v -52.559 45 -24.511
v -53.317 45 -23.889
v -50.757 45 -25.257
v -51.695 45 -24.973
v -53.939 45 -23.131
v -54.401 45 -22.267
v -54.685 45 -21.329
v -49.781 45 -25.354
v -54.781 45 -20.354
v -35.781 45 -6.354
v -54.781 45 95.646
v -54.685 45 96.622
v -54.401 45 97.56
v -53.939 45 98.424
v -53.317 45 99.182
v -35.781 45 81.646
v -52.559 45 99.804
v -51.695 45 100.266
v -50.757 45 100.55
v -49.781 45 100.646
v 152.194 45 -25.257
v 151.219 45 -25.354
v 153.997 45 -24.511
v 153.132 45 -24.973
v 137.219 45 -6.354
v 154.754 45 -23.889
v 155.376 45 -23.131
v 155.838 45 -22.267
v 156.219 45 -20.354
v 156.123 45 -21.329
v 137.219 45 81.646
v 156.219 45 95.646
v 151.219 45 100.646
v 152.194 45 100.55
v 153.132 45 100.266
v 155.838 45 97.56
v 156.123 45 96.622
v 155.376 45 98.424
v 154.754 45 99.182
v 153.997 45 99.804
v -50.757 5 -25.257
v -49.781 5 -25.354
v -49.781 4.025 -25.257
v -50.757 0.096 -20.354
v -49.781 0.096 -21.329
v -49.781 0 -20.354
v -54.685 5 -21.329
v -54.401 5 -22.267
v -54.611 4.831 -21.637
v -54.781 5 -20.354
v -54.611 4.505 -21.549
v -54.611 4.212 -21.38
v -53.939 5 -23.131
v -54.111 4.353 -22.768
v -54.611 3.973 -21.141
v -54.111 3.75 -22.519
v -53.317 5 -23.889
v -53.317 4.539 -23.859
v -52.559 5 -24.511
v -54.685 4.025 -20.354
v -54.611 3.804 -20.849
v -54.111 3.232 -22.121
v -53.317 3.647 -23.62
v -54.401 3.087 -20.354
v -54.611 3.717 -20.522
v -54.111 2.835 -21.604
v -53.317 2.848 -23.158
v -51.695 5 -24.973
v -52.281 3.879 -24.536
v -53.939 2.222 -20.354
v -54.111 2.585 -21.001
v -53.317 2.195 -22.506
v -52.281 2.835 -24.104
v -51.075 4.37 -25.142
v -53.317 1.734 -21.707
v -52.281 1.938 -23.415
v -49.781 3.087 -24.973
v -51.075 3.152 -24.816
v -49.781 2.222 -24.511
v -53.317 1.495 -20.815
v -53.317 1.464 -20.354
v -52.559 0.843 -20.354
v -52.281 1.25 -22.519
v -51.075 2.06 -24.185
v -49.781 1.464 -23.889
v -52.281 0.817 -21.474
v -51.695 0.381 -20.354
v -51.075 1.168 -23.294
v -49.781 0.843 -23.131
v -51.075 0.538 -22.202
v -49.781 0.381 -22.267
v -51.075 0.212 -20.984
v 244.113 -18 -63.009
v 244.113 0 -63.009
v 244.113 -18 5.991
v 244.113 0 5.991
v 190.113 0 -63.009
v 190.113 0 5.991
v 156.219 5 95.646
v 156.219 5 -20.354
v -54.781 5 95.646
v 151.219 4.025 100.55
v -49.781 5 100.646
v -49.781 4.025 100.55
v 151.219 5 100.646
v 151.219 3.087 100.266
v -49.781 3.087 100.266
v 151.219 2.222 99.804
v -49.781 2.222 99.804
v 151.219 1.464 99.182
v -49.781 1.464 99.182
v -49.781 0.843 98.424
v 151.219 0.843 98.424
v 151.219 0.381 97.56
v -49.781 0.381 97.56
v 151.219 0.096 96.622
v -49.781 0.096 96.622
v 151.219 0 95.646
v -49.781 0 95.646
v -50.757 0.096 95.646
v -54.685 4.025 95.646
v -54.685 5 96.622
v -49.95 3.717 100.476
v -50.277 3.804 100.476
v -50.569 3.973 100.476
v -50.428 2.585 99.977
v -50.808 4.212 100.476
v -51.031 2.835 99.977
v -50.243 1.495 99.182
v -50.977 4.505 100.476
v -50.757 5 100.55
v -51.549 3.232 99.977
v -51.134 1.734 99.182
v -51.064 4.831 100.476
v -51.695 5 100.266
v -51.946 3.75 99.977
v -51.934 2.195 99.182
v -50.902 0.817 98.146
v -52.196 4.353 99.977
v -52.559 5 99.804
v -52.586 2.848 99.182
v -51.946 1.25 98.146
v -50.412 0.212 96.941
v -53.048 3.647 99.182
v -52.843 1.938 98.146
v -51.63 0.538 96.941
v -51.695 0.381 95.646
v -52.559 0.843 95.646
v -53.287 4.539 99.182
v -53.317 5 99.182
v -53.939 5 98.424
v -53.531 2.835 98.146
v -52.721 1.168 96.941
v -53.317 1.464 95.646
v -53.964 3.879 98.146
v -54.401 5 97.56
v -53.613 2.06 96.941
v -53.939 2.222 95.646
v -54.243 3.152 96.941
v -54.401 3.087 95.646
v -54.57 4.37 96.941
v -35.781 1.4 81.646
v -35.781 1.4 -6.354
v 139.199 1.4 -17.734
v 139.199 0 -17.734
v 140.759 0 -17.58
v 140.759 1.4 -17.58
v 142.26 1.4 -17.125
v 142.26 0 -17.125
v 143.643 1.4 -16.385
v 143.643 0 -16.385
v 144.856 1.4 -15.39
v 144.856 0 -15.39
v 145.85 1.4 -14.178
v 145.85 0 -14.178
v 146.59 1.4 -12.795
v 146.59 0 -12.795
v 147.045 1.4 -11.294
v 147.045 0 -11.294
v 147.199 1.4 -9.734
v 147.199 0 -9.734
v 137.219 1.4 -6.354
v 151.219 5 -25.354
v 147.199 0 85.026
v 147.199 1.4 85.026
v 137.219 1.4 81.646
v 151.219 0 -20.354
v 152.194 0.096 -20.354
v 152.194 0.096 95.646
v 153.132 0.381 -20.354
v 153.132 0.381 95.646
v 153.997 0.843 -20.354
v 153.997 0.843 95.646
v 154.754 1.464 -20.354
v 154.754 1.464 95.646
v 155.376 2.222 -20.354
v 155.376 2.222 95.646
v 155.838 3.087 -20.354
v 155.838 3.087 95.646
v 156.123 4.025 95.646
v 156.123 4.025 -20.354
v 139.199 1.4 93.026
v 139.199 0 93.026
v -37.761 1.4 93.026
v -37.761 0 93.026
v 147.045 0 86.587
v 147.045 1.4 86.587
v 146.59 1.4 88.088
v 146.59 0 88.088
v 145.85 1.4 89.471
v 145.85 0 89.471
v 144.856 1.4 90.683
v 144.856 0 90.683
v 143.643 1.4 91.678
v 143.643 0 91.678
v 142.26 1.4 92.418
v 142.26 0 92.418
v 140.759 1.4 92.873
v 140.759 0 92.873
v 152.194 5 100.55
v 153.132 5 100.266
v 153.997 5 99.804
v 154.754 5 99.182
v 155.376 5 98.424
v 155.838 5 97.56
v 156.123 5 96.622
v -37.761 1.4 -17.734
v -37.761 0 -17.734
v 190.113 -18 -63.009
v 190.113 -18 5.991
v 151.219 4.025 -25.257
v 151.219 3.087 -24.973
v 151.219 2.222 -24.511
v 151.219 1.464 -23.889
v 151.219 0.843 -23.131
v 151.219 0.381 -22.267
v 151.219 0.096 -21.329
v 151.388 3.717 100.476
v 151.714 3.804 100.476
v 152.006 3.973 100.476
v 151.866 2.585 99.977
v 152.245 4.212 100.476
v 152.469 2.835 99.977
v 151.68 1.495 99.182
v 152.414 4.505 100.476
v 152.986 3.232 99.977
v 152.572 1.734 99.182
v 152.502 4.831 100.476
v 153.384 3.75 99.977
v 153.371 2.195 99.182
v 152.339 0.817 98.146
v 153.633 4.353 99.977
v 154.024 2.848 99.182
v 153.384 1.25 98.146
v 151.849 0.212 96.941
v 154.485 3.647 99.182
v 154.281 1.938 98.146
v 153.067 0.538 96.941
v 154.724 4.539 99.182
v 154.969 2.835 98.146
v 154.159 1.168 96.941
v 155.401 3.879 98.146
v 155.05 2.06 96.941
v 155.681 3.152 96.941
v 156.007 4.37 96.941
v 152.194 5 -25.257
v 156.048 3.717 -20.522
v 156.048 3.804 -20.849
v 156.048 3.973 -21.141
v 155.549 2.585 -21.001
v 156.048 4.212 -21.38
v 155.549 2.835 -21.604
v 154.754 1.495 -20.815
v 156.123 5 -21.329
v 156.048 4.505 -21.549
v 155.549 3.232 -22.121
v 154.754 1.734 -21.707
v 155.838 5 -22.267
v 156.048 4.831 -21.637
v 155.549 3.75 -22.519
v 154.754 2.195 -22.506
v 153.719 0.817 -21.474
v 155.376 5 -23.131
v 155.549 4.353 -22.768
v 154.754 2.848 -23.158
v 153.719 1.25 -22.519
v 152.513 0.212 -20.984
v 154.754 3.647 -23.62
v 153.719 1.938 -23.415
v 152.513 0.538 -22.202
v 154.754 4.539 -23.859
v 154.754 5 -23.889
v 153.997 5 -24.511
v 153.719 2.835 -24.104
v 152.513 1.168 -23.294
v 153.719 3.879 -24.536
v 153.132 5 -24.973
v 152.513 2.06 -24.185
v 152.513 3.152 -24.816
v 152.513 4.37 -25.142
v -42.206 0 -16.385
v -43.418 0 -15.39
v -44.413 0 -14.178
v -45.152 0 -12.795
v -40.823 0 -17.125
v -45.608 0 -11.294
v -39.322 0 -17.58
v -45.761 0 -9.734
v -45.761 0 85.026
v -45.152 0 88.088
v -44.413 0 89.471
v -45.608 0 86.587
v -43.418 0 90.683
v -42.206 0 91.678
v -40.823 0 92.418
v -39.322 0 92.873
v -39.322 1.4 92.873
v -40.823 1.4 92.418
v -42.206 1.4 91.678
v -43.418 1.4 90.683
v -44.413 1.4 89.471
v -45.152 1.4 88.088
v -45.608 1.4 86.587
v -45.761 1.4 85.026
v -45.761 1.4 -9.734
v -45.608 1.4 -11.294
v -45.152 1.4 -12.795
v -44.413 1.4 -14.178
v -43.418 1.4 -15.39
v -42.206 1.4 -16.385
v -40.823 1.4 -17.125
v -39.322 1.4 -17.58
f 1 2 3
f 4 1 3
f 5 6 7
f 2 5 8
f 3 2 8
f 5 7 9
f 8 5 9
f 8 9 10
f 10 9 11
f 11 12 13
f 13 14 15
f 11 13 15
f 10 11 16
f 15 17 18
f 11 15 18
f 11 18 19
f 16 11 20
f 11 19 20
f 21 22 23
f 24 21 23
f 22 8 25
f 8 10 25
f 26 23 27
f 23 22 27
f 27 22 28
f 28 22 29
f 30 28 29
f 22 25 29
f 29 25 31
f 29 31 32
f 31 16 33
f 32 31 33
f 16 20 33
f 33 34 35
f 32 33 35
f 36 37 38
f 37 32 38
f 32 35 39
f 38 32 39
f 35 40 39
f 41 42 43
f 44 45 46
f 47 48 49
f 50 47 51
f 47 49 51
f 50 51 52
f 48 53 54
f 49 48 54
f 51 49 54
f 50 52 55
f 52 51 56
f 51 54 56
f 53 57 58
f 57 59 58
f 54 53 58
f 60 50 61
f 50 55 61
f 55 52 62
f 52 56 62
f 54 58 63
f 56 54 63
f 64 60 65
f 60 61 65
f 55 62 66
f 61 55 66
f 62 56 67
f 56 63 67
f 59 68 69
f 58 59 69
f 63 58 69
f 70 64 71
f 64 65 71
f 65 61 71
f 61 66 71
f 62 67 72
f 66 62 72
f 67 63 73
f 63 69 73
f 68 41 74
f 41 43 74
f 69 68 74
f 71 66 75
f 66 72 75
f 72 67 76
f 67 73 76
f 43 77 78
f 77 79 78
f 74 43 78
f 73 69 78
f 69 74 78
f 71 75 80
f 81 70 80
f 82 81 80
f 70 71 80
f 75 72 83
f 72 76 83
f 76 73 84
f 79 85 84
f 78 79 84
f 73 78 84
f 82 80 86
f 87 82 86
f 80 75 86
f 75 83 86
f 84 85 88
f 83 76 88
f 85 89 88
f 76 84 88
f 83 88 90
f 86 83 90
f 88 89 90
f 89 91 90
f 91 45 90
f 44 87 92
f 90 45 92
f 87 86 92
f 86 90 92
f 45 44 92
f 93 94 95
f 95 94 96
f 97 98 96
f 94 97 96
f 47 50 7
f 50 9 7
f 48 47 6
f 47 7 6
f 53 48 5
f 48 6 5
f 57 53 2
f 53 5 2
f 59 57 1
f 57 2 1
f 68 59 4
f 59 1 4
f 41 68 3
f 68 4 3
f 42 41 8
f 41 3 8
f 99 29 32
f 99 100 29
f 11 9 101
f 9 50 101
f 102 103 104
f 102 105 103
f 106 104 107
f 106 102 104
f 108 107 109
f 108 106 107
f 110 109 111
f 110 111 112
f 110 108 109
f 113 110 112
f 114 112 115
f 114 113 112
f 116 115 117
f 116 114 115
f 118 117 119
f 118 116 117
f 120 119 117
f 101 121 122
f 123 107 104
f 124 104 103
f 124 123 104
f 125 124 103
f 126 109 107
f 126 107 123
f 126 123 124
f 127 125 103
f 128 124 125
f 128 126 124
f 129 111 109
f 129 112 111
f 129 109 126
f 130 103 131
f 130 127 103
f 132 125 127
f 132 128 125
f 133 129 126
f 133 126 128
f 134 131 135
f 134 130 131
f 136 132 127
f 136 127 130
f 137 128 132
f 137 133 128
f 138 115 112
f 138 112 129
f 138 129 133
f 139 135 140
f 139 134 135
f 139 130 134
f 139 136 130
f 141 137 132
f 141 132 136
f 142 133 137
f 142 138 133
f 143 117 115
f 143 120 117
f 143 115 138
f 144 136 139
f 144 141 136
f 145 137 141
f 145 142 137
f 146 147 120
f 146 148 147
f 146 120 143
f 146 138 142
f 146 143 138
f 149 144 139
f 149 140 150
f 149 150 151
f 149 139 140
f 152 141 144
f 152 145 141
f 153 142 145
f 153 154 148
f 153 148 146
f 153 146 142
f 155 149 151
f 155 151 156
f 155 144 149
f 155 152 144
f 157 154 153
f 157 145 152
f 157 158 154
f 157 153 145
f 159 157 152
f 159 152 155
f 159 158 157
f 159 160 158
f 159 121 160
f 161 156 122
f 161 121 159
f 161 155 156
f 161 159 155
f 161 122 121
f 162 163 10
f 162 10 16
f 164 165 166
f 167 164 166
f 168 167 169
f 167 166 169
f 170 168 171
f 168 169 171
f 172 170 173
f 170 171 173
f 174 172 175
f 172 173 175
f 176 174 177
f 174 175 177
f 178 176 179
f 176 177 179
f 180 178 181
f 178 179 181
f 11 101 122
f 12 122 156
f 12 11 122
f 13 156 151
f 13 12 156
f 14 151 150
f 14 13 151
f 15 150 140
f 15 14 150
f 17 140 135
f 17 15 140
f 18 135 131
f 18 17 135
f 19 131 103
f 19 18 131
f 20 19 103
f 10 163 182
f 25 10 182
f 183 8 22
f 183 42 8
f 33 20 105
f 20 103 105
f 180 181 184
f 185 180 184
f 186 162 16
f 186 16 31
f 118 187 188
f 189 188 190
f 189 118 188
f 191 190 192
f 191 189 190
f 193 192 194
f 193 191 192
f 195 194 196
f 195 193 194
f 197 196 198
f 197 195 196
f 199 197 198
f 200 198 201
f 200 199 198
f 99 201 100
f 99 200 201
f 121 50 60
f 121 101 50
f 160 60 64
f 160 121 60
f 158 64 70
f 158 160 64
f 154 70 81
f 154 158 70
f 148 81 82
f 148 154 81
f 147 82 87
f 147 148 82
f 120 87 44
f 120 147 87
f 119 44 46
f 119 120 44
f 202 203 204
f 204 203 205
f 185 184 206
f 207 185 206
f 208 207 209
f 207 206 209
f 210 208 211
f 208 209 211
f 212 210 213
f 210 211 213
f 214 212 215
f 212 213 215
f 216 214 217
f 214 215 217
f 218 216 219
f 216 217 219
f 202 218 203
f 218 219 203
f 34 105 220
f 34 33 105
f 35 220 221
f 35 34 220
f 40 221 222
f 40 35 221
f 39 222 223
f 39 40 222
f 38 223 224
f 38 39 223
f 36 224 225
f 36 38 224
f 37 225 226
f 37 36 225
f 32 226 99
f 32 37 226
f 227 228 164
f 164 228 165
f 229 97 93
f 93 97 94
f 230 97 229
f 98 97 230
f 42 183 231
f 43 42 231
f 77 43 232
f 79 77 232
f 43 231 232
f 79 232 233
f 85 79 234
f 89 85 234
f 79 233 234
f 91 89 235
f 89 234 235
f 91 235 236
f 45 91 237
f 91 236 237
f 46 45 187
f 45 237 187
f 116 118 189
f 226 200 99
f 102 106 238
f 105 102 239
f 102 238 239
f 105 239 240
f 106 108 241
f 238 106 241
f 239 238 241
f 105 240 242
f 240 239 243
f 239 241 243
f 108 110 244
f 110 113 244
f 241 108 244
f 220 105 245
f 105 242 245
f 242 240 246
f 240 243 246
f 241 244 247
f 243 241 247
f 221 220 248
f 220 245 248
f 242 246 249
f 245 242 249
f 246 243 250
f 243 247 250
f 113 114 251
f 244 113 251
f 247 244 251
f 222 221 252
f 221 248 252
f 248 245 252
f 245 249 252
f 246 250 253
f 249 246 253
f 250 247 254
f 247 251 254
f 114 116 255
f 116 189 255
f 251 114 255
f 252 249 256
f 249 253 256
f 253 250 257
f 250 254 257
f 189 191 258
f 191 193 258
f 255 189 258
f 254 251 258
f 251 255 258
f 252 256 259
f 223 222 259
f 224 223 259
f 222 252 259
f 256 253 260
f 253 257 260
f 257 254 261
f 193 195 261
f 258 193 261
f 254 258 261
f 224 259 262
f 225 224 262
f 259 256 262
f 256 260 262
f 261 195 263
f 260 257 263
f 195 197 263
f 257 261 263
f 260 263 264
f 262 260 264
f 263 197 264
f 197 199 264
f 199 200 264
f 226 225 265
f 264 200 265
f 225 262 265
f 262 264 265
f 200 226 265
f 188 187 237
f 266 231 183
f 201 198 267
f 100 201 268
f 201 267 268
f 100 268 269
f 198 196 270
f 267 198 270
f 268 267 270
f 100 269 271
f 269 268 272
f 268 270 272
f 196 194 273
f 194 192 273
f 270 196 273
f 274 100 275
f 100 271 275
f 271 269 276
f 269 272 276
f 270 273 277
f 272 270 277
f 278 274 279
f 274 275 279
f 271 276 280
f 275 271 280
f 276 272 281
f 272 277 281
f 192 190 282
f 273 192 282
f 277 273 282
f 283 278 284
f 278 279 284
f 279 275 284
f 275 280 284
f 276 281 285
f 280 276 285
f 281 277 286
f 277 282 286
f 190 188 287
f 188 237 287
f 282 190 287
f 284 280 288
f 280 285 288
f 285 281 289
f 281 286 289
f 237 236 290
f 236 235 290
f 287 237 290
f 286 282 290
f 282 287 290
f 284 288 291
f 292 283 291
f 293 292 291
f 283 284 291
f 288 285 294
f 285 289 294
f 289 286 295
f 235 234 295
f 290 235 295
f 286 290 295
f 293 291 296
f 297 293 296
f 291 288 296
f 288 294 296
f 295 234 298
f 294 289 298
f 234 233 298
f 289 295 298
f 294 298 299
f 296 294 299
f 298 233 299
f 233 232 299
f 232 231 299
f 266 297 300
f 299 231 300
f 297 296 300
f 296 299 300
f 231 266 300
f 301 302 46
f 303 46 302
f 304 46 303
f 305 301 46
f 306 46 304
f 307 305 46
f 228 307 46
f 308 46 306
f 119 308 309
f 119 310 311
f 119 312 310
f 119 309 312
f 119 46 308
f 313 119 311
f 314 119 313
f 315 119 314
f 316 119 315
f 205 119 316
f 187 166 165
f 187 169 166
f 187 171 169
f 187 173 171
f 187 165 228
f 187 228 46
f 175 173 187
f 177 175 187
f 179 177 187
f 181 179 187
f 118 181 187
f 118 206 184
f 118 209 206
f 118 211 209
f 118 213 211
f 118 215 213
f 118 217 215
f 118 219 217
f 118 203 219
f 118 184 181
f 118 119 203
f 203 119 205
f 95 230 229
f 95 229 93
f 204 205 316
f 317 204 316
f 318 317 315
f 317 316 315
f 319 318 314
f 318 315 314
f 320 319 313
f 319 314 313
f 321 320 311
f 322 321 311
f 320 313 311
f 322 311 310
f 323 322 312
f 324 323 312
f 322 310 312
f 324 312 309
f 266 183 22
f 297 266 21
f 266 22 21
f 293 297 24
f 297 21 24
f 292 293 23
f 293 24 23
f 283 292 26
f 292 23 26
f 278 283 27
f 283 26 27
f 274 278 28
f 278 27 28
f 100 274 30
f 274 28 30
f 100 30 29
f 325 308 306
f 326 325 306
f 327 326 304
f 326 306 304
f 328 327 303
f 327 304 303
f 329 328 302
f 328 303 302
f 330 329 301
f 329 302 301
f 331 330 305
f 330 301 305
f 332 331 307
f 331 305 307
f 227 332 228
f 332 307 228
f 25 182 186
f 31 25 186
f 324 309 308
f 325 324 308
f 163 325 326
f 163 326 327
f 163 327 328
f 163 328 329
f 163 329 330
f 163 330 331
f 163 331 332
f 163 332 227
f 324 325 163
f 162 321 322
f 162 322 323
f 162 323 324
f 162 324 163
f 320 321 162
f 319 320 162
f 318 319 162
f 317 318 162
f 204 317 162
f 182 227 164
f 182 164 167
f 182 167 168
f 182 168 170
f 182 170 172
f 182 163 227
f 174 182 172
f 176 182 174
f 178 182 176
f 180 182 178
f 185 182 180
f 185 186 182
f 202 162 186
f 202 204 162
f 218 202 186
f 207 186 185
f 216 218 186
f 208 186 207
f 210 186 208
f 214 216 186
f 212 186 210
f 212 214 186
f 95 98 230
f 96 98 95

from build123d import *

# Parameters (mm, degrees)
F0_W     = 211
F0_H     = 126
F0_W_2   = 173
F0_H_2   = 88
F1_DEPTH = 45
F2_DEPTH = 1.4
F3_R     = 5
F4_W     = 54
F4_H     = 69
F5_DEPTH = 18


with BuildPart() as f1:
    # F0 (on Front) → F1 (new body)
    with BuildSketch(Plane.XZ):
        with Locations((50.718681, 37.646487)):
            Rectangle(F0_W, F0_H)
        with BuildLine():
            ThreePointArc((-45.761319, 85.026487), (-43.418173, 90.683341), (-37.761319, 93.026487))
            Line((-37.761319, 93.026487), (139.198681, 93.026487))
            ThreePointArc((139.198681, 93.026487), (144.855535, 90.683341), (147.198681, 85.026487))
            Line((147.198681, 85.026487), (147.198681, -9.733513))
            ThreePointArc((147.198681, -9.733513), (144.855535, -15.390367), (139.198681, -17.733513))
            Line((139.198681, -17.733513), (-37.761319, -17.733513))
            ThreePointArc((-37.761319, -17.733513), (-43.418173, -15.390367), (-45.761319, -9.733513))
            Line((-45.761319, -9.733513), (-45.761319, 85.026487))
        make_face(mode=Mode.SUBTRACT)
        with BuildLine():
            Line((139.198681, 93.026487), (-37.761319, 93.026487))
            ThreePointArc((-37.761319, 93.026487), (-43.418173, 90.683341), (-45.761319, 85.026487))
            Line((-45.761319, 85.026487), (-45.761319, -9.733513))
            ThreePointArc((-45.761319, -9.733513), (-43.418173, -15.390367), (-37.761319, -17.733513))
            Line((-37.761319, -17.733513), (139.198681, -17.733513))
            ThreePointArc((139.198681, -17.733513), (144.855535, -15.390367), (147.198681, -9.733513))
            Line((147.198681, -9.733513), (147.198681, 85.026487))
            ThreePointArc((147.198681, 85.026487), (144.855535, 90.683341), (139.198681, 93.026487))
        make_face()
        with Locations((50.718681, 37.646487)):
            Rectangle(F0_W_2, F0_H_2, mode=Mode.SUBTRACT)
    extrude(amount=-F1_DEPTH)

    # F0 (on Front) → F2 (cut)
    with BuildSketch(Plane.XZ):
        with BuildLine():
            Line((139.198681, 93.026487), (-37.761319, 93.026487))
            ThreePointArc((-37.761319, 93.026487), (-43.418173, 90.683341), (-45.761319, 85.026487))
            Line((-45.761319, 85.026487), (-45.761319, -9.733513))
            ThreePointArc((-45.761319, -9.733513), (-43.418173, -15.390367), (-37.761319, -17.733513))
            Line((-37.761319, -17.733513), (139.198681, -17.733513))
            ThreePointArc((139.198681, -17.733513), (144.855535, -15.390367), (147.198681, -9.733513))
            Line((147.198681, -9.733513), (147.198681, 85.026487))
            ThreePointArc((147.198681, 85.026487), (144.855535, 90.683341), (139.198681, 93.026487))
        make_face()
        with Locations((50.718681, 37.646487)):
            Rectangle(F0_W_2, F0_H_2, mode=Mode.SUBTRACT)
    extrude(amount=-F2_DEPTH, mode=Mode.SUBTRACT)

    # F3
    f3_edges = [f1.edges().sort_by_distance(p)[0] for p in [
        (50.718681, 0, -25.353513),
        (156.218681, 0, 37.646487),
        (156.218681, 22.5, -25.353513),
        (-54.781319, 22.5, -25.353513),
        (-54.781319, 0, 37.646487),
        (50.718681, 0, 100.646487),
        (156.218681, 22.5, 100.646487),
        (-54.781319, 22.5, 100.646487),
    ]]
    fillet(f3_edges, radius=F3_R)


with BuildPart() as f5:
    # F4 (on Front) → F5 (new body)
    with BuildSketch(Plane.XZ):
        with Locations((217.112735, -28.509299)):
            Rectangle(F4_W, F4_H)
    extrude(amount=F5_DEPTH)


solid = Compound([f1.part, f5.part])
